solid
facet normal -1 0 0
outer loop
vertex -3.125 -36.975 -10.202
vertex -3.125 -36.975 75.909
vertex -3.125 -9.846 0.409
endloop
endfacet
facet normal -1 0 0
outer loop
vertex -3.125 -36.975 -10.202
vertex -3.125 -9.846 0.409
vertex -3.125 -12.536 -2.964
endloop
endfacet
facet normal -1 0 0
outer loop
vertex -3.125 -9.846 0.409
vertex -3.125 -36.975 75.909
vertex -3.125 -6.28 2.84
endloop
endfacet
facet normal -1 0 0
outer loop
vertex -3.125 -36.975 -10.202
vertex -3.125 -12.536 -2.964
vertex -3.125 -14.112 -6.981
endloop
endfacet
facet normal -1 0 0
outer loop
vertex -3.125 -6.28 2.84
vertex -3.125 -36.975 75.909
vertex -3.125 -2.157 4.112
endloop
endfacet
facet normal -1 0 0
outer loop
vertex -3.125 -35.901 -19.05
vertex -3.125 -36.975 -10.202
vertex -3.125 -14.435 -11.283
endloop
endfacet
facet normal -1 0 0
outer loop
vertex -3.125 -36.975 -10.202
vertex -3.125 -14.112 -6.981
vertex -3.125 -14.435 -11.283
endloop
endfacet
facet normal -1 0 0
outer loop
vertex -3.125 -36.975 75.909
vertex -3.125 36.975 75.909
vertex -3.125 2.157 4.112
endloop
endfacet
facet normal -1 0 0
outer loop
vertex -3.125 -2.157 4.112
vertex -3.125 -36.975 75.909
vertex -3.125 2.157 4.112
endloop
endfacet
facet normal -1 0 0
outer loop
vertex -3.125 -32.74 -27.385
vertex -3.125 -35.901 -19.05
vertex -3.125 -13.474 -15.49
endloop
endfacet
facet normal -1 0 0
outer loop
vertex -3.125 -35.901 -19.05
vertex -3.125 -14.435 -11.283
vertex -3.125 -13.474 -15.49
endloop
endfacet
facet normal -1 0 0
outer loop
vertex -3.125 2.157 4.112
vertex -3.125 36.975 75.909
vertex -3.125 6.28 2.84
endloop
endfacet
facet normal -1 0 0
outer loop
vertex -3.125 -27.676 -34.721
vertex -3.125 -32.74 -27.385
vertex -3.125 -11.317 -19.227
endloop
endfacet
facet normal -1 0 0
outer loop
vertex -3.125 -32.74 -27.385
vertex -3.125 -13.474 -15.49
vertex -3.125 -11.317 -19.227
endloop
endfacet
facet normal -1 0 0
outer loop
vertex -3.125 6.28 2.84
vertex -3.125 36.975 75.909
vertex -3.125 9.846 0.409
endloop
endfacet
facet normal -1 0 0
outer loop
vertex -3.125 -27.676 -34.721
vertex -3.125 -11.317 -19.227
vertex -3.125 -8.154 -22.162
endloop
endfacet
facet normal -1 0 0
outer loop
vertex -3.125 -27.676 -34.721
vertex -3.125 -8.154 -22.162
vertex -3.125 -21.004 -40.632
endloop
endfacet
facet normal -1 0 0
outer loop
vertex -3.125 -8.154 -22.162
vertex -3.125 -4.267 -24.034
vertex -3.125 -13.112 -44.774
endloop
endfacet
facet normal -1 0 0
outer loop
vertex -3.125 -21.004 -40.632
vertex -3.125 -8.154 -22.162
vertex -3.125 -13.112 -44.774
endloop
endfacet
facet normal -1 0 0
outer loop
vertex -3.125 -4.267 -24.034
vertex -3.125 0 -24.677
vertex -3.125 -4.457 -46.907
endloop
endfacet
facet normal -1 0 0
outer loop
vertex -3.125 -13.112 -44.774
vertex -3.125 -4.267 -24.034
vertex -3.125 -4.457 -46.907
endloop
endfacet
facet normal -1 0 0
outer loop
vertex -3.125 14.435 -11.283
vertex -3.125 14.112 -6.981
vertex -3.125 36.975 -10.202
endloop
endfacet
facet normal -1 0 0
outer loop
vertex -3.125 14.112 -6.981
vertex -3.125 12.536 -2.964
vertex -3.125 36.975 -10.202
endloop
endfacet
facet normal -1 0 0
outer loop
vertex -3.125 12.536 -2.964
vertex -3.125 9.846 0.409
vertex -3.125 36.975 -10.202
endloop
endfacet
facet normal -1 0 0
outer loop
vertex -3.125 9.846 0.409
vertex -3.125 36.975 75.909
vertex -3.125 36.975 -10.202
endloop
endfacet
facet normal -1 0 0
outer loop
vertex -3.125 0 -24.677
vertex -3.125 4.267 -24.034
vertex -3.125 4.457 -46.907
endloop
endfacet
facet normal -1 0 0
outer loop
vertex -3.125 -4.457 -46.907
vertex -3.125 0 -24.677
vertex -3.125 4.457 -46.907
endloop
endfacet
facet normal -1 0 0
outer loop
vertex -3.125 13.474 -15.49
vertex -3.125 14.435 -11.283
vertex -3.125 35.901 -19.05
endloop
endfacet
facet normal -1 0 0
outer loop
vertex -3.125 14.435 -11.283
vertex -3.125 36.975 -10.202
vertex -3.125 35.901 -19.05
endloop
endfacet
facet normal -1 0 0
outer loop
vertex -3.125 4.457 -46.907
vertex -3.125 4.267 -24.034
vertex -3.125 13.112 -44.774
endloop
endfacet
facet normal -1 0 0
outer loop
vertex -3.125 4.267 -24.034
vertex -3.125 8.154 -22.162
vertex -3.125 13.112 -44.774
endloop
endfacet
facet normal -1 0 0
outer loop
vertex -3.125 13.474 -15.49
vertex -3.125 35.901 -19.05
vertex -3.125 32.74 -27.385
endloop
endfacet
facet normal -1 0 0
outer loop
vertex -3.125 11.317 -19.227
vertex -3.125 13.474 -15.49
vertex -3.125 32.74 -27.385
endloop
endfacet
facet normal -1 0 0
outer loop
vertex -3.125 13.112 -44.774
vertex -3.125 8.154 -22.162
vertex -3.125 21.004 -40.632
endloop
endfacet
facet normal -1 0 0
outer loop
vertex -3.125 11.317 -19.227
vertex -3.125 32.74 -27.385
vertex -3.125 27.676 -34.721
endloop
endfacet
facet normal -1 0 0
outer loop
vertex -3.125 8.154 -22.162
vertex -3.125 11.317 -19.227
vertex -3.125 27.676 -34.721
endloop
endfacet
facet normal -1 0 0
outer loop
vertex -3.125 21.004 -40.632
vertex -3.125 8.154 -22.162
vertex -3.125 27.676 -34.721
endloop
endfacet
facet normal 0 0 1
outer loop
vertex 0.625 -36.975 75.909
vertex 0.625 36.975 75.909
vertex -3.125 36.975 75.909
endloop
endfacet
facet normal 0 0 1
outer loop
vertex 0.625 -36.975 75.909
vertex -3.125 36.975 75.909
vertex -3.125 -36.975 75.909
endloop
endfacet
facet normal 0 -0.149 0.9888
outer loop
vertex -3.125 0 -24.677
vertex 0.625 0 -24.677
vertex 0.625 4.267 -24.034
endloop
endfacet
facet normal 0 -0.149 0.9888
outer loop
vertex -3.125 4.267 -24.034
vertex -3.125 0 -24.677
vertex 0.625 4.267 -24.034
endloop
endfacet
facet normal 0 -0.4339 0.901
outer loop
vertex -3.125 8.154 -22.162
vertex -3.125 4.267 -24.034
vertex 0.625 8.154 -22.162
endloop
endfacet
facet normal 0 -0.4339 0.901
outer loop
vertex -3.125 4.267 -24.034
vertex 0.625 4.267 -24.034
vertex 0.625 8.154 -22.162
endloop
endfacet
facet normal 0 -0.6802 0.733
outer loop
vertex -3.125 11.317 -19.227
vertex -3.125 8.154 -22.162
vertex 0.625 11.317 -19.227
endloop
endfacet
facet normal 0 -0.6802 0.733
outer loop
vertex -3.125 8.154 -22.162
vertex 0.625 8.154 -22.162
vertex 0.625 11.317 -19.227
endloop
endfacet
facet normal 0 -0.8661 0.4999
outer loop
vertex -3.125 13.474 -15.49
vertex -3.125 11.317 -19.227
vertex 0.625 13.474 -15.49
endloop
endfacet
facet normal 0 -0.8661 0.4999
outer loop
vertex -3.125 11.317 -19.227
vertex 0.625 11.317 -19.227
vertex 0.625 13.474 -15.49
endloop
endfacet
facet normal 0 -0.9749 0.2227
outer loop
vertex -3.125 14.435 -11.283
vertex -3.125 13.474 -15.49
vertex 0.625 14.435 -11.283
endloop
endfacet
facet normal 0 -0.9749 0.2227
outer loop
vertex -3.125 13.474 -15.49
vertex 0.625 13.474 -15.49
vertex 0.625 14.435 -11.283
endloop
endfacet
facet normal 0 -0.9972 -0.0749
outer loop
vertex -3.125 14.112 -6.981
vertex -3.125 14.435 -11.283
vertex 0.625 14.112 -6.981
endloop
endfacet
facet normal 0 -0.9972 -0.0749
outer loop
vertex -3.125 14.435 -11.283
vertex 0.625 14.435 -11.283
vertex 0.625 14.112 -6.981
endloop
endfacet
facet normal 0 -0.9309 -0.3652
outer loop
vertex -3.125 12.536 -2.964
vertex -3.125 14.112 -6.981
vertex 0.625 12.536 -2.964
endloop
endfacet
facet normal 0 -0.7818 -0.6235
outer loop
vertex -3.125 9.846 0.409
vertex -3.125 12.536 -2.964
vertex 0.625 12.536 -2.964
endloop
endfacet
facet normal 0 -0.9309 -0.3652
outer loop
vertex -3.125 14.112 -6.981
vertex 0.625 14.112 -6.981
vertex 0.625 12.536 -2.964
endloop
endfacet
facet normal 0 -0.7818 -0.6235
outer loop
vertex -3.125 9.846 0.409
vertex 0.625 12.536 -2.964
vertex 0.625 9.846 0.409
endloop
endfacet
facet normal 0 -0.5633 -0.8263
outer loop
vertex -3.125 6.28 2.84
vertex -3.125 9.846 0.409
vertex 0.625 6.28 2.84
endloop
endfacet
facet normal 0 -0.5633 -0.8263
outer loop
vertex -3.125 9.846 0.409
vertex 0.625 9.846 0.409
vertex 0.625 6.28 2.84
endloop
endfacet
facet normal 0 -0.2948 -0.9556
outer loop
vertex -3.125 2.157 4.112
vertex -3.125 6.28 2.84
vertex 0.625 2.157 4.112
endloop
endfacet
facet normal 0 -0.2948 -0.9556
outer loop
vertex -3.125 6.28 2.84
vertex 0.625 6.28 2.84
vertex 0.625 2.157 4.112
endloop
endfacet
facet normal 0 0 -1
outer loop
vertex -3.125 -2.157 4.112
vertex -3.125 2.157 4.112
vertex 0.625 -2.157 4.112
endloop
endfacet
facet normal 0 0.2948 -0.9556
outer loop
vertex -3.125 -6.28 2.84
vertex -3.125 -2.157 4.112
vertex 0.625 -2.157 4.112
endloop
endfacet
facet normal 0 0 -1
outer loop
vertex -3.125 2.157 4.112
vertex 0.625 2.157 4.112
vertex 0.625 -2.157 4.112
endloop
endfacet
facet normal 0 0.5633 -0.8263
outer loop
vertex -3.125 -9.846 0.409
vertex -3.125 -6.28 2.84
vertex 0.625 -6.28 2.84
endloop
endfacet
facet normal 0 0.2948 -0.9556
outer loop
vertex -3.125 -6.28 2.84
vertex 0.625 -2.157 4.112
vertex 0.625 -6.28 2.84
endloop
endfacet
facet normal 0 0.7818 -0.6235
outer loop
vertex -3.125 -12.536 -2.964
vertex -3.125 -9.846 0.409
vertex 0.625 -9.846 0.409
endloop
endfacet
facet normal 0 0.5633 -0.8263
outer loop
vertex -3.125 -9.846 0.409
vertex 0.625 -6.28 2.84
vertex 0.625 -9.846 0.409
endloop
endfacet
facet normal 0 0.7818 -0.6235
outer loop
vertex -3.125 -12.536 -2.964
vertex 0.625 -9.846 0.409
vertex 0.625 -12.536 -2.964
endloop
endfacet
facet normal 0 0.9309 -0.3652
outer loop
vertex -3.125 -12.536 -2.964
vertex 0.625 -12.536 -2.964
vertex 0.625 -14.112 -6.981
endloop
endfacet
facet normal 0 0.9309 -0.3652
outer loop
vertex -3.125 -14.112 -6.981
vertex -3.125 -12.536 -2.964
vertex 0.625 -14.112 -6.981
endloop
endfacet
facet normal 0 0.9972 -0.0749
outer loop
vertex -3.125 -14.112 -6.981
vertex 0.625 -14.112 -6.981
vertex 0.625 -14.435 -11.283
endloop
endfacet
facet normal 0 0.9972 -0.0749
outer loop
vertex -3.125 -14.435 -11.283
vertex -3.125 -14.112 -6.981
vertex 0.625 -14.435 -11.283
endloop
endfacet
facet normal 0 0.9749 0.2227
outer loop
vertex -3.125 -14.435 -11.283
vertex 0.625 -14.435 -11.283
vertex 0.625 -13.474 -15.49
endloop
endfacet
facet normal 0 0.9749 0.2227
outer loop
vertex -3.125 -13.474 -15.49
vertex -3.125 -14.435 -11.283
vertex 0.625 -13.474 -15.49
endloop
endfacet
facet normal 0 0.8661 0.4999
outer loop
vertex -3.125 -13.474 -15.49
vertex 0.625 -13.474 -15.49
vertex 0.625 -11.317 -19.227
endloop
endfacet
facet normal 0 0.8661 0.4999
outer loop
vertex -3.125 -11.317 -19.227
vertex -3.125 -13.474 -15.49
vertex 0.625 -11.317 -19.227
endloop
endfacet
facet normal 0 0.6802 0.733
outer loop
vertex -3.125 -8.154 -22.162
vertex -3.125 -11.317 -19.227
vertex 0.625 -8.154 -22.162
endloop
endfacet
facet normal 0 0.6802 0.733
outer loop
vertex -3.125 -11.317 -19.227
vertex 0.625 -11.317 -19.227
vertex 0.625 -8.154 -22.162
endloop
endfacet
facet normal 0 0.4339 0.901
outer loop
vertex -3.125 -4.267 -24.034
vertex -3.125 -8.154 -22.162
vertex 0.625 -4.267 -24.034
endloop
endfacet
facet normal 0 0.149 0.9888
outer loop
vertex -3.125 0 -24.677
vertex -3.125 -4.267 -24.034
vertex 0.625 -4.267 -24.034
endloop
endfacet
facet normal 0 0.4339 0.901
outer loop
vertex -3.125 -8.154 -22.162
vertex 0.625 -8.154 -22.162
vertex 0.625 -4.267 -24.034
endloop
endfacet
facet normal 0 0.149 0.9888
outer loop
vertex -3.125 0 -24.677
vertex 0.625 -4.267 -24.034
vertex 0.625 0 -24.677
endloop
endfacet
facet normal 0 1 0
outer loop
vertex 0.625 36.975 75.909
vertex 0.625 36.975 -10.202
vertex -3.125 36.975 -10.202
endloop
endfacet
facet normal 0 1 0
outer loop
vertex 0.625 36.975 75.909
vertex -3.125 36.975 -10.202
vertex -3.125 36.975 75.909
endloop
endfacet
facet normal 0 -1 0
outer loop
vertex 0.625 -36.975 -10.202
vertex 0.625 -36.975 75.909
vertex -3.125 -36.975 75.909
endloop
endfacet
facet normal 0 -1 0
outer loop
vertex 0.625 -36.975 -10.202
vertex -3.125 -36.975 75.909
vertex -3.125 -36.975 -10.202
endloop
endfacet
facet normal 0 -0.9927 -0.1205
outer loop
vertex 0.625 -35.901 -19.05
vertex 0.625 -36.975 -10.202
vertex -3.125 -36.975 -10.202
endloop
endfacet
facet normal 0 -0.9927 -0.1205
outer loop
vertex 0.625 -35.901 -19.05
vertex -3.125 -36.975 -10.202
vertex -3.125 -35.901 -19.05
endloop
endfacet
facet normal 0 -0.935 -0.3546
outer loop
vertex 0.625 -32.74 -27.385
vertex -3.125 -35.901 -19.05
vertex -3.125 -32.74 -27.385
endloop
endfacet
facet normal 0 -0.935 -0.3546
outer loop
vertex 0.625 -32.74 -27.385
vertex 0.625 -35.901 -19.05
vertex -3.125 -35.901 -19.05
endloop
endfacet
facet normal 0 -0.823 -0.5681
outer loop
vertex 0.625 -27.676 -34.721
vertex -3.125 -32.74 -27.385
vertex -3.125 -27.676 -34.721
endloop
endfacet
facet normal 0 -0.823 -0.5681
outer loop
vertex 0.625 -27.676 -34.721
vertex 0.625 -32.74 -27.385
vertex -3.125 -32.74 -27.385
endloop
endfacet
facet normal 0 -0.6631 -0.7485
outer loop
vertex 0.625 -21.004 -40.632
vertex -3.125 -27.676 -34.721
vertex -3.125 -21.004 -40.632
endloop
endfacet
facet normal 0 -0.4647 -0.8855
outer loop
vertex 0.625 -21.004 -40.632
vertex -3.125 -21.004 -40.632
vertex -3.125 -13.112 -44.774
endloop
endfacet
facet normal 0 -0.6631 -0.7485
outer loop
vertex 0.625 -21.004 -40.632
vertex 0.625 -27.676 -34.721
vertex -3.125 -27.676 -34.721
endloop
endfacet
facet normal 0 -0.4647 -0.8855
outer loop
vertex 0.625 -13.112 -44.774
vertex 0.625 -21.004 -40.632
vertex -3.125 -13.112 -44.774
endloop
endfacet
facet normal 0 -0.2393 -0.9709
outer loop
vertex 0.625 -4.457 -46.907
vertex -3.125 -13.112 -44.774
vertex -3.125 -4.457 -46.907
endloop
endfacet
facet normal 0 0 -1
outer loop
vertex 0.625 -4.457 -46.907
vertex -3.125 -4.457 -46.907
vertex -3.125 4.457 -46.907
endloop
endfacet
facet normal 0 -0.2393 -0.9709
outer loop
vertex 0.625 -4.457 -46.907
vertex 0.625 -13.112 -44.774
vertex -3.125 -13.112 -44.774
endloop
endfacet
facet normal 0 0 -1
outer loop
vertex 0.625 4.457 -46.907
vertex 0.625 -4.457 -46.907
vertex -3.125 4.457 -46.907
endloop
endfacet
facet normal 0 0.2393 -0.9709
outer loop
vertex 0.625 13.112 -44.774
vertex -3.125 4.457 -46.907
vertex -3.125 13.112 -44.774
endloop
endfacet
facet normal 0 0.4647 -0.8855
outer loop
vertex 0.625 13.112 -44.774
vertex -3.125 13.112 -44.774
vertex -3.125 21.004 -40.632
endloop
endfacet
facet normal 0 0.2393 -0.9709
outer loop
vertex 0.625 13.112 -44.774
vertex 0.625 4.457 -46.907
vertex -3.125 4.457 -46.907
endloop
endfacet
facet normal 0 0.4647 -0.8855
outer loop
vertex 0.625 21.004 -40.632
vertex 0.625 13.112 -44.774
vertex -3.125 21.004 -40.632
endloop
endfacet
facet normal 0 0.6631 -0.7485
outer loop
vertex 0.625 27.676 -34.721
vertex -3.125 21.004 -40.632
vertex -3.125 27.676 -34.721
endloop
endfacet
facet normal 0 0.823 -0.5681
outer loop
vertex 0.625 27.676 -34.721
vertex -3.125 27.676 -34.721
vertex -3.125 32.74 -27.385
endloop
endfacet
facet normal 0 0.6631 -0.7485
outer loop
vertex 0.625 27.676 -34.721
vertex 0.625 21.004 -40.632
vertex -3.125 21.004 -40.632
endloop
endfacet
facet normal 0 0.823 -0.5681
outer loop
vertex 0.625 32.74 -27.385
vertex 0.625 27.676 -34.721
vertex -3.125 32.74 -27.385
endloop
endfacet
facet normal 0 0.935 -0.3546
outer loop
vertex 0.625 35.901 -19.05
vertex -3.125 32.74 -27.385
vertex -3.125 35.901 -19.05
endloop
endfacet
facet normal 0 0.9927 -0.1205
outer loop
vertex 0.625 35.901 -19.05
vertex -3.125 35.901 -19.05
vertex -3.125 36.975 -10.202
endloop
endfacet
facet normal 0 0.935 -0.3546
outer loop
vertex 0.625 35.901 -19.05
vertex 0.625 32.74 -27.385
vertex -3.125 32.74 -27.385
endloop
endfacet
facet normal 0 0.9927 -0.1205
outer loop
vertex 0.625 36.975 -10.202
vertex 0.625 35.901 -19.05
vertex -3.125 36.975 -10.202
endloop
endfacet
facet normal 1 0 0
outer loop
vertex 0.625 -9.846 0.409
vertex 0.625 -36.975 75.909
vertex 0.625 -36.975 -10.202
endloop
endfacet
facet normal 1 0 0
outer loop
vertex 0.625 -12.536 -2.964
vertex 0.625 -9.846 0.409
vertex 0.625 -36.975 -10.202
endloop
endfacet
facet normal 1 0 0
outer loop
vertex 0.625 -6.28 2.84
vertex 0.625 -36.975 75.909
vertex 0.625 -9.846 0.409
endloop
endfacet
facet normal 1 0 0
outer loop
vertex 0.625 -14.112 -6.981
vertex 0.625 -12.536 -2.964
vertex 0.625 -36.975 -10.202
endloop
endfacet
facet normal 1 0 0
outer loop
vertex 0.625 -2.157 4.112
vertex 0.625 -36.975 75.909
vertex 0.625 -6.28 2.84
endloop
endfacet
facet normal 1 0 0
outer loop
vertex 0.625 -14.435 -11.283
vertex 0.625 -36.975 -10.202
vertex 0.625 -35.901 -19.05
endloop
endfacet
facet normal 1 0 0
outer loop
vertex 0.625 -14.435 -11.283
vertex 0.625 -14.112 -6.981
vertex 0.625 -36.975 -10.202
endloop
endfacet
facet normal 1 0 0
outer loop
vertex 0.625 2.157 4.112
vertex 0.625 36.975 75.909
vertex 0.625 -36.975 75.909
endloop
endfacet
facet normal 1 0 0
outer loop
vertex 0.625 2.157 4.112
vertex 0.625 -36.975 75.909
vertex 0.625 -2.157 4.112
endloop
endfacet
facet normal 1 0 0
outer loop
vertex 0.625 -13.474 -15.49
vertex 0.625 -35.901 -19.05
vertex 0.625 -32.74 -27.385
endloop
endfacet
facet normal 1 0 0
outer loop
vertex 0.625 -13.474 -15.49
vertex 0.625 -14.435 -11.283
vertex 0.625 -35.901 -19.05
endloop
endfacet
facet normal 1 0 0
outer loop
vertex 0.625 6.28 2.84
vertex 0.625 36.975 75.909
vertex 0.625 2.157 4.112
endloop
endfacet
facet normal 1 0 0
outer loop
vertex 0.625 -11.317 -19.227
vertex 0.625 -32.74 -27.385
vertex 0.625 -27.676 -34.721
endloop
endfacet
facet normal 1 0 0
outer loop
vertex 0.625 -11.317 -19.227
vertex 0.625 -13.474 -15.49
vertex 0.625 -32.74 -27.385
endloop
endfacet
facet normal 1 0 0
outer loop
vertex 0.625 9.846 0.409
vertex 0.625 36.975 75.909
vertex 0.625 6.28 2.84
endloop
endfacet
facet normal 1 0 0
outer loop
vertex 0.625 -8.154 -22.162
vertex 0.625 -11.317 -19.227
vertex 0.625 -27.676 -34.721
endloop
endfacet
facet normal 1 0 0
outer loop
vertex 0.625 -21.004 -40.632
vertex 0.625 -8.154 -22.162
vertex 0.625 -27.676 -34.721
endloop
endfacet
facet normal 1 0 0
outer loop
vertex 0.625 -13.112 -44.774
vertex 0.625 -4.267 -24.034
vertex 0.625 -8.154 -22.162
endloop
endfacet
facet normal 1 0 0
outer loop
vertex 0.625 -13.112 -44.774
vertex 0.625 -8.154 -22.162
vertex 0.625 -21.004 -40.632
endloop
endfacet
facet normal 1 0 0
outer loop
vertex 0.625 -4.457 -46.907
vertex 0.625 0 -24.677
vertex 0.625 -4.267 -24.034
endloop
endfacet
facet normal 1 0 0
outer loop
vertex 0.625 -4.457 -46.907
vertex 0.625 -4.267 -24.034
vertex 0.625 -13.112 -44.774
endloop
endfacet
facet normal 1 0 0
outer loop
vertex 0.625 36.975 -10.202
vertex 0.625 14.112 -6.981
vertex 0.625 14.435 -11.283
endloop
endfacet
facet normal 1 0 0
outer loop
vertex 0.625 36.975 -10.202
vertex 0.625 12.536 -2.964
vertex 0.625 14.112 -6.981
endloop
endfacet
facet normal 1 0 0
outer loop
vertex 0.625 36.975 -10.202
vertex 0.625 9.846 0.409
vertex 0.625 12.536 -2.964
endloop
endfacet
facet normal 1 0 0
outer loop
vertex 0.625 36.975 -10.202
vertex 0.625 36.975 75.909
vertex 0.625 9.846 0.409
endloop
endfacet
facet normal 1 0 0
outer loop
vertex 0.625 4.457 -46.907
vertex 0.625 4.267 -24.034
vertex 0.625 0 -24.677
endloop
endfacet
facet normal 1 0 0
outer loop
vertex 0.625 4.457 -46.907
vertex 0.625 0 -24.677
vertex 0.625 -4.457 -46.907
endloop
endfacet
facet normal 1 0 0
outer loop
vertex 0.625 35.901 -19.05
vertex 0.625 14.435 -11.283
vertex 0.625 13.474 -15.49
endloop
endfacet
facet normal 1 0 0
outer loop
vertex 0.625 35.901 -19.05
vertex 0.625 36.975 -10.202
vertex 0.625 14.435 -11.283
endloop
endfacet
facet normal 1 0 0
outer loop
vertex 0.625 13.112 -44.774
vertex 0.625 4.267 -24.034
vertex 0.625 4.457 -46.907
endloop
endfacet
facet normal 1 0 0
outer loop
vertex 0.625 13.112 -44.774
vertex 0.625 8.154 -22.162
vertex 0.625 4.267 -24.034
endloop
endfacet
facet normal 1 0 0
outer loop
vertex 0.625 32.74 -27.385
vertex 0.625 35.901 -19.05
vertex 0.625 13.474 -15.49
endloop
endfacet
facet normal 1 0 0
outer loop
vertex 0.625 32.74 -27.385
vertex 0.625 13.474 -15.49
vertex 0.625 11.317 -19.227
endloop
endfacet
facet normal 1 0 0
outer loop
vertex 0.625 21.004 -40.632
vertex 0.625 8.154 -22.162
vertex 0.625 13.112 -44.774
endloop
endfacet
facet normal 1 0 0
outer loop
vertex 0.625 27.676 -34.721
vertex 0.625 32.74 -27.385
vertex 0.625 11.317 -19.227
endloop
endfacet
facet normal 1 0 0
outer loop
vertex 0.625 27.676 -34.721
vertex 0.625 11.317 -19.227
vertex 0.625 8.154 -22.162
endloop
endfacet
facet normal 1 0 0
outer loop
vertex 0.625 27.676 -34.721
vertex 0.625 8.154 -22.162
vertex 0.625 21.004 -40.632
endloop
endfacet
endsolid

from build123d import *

# Parameters (mm, degrees)
SKETCH1_R          = 9.65
BASE_FLANGE1_DEPTH = 2.5
SCALE1_SCALE       = 1.5


# Sheet-metal steps are written as plain solids
with BuildPart() as part:
    # Sketch1 → Base-Flange1 (new body)
    with BuildSketch(Plane(origin=(0, 0, 0), x_dir=(0, 0, -1), z_dir=(1, 0, 0))):
        with BuildLine():
            Line((0, 24.65), (-57.40704, 24.65))
            Line((-57.40704, 24.65), (-57.40704, -24.65))
            Line((-57.40704, -24.65), (0, -24.65))
            ThreePointArc((0, -24.65), (24.65, 0), (0, 24.65))
        make_face()
        Circle(SKETCH1_R, mode=Mode.SUBTRACT)
    extrude(amount=-BASE_FLANGE1_DEPTH)


with BuildPart() as part_1:
    # Scale1: scaled about (-1.25, 0, 20.403540004)
    add(part.part.scale(SCALE1_SCALE).moved(Location((0.625, 0, -10.201770002))))


solid = part_1.part
